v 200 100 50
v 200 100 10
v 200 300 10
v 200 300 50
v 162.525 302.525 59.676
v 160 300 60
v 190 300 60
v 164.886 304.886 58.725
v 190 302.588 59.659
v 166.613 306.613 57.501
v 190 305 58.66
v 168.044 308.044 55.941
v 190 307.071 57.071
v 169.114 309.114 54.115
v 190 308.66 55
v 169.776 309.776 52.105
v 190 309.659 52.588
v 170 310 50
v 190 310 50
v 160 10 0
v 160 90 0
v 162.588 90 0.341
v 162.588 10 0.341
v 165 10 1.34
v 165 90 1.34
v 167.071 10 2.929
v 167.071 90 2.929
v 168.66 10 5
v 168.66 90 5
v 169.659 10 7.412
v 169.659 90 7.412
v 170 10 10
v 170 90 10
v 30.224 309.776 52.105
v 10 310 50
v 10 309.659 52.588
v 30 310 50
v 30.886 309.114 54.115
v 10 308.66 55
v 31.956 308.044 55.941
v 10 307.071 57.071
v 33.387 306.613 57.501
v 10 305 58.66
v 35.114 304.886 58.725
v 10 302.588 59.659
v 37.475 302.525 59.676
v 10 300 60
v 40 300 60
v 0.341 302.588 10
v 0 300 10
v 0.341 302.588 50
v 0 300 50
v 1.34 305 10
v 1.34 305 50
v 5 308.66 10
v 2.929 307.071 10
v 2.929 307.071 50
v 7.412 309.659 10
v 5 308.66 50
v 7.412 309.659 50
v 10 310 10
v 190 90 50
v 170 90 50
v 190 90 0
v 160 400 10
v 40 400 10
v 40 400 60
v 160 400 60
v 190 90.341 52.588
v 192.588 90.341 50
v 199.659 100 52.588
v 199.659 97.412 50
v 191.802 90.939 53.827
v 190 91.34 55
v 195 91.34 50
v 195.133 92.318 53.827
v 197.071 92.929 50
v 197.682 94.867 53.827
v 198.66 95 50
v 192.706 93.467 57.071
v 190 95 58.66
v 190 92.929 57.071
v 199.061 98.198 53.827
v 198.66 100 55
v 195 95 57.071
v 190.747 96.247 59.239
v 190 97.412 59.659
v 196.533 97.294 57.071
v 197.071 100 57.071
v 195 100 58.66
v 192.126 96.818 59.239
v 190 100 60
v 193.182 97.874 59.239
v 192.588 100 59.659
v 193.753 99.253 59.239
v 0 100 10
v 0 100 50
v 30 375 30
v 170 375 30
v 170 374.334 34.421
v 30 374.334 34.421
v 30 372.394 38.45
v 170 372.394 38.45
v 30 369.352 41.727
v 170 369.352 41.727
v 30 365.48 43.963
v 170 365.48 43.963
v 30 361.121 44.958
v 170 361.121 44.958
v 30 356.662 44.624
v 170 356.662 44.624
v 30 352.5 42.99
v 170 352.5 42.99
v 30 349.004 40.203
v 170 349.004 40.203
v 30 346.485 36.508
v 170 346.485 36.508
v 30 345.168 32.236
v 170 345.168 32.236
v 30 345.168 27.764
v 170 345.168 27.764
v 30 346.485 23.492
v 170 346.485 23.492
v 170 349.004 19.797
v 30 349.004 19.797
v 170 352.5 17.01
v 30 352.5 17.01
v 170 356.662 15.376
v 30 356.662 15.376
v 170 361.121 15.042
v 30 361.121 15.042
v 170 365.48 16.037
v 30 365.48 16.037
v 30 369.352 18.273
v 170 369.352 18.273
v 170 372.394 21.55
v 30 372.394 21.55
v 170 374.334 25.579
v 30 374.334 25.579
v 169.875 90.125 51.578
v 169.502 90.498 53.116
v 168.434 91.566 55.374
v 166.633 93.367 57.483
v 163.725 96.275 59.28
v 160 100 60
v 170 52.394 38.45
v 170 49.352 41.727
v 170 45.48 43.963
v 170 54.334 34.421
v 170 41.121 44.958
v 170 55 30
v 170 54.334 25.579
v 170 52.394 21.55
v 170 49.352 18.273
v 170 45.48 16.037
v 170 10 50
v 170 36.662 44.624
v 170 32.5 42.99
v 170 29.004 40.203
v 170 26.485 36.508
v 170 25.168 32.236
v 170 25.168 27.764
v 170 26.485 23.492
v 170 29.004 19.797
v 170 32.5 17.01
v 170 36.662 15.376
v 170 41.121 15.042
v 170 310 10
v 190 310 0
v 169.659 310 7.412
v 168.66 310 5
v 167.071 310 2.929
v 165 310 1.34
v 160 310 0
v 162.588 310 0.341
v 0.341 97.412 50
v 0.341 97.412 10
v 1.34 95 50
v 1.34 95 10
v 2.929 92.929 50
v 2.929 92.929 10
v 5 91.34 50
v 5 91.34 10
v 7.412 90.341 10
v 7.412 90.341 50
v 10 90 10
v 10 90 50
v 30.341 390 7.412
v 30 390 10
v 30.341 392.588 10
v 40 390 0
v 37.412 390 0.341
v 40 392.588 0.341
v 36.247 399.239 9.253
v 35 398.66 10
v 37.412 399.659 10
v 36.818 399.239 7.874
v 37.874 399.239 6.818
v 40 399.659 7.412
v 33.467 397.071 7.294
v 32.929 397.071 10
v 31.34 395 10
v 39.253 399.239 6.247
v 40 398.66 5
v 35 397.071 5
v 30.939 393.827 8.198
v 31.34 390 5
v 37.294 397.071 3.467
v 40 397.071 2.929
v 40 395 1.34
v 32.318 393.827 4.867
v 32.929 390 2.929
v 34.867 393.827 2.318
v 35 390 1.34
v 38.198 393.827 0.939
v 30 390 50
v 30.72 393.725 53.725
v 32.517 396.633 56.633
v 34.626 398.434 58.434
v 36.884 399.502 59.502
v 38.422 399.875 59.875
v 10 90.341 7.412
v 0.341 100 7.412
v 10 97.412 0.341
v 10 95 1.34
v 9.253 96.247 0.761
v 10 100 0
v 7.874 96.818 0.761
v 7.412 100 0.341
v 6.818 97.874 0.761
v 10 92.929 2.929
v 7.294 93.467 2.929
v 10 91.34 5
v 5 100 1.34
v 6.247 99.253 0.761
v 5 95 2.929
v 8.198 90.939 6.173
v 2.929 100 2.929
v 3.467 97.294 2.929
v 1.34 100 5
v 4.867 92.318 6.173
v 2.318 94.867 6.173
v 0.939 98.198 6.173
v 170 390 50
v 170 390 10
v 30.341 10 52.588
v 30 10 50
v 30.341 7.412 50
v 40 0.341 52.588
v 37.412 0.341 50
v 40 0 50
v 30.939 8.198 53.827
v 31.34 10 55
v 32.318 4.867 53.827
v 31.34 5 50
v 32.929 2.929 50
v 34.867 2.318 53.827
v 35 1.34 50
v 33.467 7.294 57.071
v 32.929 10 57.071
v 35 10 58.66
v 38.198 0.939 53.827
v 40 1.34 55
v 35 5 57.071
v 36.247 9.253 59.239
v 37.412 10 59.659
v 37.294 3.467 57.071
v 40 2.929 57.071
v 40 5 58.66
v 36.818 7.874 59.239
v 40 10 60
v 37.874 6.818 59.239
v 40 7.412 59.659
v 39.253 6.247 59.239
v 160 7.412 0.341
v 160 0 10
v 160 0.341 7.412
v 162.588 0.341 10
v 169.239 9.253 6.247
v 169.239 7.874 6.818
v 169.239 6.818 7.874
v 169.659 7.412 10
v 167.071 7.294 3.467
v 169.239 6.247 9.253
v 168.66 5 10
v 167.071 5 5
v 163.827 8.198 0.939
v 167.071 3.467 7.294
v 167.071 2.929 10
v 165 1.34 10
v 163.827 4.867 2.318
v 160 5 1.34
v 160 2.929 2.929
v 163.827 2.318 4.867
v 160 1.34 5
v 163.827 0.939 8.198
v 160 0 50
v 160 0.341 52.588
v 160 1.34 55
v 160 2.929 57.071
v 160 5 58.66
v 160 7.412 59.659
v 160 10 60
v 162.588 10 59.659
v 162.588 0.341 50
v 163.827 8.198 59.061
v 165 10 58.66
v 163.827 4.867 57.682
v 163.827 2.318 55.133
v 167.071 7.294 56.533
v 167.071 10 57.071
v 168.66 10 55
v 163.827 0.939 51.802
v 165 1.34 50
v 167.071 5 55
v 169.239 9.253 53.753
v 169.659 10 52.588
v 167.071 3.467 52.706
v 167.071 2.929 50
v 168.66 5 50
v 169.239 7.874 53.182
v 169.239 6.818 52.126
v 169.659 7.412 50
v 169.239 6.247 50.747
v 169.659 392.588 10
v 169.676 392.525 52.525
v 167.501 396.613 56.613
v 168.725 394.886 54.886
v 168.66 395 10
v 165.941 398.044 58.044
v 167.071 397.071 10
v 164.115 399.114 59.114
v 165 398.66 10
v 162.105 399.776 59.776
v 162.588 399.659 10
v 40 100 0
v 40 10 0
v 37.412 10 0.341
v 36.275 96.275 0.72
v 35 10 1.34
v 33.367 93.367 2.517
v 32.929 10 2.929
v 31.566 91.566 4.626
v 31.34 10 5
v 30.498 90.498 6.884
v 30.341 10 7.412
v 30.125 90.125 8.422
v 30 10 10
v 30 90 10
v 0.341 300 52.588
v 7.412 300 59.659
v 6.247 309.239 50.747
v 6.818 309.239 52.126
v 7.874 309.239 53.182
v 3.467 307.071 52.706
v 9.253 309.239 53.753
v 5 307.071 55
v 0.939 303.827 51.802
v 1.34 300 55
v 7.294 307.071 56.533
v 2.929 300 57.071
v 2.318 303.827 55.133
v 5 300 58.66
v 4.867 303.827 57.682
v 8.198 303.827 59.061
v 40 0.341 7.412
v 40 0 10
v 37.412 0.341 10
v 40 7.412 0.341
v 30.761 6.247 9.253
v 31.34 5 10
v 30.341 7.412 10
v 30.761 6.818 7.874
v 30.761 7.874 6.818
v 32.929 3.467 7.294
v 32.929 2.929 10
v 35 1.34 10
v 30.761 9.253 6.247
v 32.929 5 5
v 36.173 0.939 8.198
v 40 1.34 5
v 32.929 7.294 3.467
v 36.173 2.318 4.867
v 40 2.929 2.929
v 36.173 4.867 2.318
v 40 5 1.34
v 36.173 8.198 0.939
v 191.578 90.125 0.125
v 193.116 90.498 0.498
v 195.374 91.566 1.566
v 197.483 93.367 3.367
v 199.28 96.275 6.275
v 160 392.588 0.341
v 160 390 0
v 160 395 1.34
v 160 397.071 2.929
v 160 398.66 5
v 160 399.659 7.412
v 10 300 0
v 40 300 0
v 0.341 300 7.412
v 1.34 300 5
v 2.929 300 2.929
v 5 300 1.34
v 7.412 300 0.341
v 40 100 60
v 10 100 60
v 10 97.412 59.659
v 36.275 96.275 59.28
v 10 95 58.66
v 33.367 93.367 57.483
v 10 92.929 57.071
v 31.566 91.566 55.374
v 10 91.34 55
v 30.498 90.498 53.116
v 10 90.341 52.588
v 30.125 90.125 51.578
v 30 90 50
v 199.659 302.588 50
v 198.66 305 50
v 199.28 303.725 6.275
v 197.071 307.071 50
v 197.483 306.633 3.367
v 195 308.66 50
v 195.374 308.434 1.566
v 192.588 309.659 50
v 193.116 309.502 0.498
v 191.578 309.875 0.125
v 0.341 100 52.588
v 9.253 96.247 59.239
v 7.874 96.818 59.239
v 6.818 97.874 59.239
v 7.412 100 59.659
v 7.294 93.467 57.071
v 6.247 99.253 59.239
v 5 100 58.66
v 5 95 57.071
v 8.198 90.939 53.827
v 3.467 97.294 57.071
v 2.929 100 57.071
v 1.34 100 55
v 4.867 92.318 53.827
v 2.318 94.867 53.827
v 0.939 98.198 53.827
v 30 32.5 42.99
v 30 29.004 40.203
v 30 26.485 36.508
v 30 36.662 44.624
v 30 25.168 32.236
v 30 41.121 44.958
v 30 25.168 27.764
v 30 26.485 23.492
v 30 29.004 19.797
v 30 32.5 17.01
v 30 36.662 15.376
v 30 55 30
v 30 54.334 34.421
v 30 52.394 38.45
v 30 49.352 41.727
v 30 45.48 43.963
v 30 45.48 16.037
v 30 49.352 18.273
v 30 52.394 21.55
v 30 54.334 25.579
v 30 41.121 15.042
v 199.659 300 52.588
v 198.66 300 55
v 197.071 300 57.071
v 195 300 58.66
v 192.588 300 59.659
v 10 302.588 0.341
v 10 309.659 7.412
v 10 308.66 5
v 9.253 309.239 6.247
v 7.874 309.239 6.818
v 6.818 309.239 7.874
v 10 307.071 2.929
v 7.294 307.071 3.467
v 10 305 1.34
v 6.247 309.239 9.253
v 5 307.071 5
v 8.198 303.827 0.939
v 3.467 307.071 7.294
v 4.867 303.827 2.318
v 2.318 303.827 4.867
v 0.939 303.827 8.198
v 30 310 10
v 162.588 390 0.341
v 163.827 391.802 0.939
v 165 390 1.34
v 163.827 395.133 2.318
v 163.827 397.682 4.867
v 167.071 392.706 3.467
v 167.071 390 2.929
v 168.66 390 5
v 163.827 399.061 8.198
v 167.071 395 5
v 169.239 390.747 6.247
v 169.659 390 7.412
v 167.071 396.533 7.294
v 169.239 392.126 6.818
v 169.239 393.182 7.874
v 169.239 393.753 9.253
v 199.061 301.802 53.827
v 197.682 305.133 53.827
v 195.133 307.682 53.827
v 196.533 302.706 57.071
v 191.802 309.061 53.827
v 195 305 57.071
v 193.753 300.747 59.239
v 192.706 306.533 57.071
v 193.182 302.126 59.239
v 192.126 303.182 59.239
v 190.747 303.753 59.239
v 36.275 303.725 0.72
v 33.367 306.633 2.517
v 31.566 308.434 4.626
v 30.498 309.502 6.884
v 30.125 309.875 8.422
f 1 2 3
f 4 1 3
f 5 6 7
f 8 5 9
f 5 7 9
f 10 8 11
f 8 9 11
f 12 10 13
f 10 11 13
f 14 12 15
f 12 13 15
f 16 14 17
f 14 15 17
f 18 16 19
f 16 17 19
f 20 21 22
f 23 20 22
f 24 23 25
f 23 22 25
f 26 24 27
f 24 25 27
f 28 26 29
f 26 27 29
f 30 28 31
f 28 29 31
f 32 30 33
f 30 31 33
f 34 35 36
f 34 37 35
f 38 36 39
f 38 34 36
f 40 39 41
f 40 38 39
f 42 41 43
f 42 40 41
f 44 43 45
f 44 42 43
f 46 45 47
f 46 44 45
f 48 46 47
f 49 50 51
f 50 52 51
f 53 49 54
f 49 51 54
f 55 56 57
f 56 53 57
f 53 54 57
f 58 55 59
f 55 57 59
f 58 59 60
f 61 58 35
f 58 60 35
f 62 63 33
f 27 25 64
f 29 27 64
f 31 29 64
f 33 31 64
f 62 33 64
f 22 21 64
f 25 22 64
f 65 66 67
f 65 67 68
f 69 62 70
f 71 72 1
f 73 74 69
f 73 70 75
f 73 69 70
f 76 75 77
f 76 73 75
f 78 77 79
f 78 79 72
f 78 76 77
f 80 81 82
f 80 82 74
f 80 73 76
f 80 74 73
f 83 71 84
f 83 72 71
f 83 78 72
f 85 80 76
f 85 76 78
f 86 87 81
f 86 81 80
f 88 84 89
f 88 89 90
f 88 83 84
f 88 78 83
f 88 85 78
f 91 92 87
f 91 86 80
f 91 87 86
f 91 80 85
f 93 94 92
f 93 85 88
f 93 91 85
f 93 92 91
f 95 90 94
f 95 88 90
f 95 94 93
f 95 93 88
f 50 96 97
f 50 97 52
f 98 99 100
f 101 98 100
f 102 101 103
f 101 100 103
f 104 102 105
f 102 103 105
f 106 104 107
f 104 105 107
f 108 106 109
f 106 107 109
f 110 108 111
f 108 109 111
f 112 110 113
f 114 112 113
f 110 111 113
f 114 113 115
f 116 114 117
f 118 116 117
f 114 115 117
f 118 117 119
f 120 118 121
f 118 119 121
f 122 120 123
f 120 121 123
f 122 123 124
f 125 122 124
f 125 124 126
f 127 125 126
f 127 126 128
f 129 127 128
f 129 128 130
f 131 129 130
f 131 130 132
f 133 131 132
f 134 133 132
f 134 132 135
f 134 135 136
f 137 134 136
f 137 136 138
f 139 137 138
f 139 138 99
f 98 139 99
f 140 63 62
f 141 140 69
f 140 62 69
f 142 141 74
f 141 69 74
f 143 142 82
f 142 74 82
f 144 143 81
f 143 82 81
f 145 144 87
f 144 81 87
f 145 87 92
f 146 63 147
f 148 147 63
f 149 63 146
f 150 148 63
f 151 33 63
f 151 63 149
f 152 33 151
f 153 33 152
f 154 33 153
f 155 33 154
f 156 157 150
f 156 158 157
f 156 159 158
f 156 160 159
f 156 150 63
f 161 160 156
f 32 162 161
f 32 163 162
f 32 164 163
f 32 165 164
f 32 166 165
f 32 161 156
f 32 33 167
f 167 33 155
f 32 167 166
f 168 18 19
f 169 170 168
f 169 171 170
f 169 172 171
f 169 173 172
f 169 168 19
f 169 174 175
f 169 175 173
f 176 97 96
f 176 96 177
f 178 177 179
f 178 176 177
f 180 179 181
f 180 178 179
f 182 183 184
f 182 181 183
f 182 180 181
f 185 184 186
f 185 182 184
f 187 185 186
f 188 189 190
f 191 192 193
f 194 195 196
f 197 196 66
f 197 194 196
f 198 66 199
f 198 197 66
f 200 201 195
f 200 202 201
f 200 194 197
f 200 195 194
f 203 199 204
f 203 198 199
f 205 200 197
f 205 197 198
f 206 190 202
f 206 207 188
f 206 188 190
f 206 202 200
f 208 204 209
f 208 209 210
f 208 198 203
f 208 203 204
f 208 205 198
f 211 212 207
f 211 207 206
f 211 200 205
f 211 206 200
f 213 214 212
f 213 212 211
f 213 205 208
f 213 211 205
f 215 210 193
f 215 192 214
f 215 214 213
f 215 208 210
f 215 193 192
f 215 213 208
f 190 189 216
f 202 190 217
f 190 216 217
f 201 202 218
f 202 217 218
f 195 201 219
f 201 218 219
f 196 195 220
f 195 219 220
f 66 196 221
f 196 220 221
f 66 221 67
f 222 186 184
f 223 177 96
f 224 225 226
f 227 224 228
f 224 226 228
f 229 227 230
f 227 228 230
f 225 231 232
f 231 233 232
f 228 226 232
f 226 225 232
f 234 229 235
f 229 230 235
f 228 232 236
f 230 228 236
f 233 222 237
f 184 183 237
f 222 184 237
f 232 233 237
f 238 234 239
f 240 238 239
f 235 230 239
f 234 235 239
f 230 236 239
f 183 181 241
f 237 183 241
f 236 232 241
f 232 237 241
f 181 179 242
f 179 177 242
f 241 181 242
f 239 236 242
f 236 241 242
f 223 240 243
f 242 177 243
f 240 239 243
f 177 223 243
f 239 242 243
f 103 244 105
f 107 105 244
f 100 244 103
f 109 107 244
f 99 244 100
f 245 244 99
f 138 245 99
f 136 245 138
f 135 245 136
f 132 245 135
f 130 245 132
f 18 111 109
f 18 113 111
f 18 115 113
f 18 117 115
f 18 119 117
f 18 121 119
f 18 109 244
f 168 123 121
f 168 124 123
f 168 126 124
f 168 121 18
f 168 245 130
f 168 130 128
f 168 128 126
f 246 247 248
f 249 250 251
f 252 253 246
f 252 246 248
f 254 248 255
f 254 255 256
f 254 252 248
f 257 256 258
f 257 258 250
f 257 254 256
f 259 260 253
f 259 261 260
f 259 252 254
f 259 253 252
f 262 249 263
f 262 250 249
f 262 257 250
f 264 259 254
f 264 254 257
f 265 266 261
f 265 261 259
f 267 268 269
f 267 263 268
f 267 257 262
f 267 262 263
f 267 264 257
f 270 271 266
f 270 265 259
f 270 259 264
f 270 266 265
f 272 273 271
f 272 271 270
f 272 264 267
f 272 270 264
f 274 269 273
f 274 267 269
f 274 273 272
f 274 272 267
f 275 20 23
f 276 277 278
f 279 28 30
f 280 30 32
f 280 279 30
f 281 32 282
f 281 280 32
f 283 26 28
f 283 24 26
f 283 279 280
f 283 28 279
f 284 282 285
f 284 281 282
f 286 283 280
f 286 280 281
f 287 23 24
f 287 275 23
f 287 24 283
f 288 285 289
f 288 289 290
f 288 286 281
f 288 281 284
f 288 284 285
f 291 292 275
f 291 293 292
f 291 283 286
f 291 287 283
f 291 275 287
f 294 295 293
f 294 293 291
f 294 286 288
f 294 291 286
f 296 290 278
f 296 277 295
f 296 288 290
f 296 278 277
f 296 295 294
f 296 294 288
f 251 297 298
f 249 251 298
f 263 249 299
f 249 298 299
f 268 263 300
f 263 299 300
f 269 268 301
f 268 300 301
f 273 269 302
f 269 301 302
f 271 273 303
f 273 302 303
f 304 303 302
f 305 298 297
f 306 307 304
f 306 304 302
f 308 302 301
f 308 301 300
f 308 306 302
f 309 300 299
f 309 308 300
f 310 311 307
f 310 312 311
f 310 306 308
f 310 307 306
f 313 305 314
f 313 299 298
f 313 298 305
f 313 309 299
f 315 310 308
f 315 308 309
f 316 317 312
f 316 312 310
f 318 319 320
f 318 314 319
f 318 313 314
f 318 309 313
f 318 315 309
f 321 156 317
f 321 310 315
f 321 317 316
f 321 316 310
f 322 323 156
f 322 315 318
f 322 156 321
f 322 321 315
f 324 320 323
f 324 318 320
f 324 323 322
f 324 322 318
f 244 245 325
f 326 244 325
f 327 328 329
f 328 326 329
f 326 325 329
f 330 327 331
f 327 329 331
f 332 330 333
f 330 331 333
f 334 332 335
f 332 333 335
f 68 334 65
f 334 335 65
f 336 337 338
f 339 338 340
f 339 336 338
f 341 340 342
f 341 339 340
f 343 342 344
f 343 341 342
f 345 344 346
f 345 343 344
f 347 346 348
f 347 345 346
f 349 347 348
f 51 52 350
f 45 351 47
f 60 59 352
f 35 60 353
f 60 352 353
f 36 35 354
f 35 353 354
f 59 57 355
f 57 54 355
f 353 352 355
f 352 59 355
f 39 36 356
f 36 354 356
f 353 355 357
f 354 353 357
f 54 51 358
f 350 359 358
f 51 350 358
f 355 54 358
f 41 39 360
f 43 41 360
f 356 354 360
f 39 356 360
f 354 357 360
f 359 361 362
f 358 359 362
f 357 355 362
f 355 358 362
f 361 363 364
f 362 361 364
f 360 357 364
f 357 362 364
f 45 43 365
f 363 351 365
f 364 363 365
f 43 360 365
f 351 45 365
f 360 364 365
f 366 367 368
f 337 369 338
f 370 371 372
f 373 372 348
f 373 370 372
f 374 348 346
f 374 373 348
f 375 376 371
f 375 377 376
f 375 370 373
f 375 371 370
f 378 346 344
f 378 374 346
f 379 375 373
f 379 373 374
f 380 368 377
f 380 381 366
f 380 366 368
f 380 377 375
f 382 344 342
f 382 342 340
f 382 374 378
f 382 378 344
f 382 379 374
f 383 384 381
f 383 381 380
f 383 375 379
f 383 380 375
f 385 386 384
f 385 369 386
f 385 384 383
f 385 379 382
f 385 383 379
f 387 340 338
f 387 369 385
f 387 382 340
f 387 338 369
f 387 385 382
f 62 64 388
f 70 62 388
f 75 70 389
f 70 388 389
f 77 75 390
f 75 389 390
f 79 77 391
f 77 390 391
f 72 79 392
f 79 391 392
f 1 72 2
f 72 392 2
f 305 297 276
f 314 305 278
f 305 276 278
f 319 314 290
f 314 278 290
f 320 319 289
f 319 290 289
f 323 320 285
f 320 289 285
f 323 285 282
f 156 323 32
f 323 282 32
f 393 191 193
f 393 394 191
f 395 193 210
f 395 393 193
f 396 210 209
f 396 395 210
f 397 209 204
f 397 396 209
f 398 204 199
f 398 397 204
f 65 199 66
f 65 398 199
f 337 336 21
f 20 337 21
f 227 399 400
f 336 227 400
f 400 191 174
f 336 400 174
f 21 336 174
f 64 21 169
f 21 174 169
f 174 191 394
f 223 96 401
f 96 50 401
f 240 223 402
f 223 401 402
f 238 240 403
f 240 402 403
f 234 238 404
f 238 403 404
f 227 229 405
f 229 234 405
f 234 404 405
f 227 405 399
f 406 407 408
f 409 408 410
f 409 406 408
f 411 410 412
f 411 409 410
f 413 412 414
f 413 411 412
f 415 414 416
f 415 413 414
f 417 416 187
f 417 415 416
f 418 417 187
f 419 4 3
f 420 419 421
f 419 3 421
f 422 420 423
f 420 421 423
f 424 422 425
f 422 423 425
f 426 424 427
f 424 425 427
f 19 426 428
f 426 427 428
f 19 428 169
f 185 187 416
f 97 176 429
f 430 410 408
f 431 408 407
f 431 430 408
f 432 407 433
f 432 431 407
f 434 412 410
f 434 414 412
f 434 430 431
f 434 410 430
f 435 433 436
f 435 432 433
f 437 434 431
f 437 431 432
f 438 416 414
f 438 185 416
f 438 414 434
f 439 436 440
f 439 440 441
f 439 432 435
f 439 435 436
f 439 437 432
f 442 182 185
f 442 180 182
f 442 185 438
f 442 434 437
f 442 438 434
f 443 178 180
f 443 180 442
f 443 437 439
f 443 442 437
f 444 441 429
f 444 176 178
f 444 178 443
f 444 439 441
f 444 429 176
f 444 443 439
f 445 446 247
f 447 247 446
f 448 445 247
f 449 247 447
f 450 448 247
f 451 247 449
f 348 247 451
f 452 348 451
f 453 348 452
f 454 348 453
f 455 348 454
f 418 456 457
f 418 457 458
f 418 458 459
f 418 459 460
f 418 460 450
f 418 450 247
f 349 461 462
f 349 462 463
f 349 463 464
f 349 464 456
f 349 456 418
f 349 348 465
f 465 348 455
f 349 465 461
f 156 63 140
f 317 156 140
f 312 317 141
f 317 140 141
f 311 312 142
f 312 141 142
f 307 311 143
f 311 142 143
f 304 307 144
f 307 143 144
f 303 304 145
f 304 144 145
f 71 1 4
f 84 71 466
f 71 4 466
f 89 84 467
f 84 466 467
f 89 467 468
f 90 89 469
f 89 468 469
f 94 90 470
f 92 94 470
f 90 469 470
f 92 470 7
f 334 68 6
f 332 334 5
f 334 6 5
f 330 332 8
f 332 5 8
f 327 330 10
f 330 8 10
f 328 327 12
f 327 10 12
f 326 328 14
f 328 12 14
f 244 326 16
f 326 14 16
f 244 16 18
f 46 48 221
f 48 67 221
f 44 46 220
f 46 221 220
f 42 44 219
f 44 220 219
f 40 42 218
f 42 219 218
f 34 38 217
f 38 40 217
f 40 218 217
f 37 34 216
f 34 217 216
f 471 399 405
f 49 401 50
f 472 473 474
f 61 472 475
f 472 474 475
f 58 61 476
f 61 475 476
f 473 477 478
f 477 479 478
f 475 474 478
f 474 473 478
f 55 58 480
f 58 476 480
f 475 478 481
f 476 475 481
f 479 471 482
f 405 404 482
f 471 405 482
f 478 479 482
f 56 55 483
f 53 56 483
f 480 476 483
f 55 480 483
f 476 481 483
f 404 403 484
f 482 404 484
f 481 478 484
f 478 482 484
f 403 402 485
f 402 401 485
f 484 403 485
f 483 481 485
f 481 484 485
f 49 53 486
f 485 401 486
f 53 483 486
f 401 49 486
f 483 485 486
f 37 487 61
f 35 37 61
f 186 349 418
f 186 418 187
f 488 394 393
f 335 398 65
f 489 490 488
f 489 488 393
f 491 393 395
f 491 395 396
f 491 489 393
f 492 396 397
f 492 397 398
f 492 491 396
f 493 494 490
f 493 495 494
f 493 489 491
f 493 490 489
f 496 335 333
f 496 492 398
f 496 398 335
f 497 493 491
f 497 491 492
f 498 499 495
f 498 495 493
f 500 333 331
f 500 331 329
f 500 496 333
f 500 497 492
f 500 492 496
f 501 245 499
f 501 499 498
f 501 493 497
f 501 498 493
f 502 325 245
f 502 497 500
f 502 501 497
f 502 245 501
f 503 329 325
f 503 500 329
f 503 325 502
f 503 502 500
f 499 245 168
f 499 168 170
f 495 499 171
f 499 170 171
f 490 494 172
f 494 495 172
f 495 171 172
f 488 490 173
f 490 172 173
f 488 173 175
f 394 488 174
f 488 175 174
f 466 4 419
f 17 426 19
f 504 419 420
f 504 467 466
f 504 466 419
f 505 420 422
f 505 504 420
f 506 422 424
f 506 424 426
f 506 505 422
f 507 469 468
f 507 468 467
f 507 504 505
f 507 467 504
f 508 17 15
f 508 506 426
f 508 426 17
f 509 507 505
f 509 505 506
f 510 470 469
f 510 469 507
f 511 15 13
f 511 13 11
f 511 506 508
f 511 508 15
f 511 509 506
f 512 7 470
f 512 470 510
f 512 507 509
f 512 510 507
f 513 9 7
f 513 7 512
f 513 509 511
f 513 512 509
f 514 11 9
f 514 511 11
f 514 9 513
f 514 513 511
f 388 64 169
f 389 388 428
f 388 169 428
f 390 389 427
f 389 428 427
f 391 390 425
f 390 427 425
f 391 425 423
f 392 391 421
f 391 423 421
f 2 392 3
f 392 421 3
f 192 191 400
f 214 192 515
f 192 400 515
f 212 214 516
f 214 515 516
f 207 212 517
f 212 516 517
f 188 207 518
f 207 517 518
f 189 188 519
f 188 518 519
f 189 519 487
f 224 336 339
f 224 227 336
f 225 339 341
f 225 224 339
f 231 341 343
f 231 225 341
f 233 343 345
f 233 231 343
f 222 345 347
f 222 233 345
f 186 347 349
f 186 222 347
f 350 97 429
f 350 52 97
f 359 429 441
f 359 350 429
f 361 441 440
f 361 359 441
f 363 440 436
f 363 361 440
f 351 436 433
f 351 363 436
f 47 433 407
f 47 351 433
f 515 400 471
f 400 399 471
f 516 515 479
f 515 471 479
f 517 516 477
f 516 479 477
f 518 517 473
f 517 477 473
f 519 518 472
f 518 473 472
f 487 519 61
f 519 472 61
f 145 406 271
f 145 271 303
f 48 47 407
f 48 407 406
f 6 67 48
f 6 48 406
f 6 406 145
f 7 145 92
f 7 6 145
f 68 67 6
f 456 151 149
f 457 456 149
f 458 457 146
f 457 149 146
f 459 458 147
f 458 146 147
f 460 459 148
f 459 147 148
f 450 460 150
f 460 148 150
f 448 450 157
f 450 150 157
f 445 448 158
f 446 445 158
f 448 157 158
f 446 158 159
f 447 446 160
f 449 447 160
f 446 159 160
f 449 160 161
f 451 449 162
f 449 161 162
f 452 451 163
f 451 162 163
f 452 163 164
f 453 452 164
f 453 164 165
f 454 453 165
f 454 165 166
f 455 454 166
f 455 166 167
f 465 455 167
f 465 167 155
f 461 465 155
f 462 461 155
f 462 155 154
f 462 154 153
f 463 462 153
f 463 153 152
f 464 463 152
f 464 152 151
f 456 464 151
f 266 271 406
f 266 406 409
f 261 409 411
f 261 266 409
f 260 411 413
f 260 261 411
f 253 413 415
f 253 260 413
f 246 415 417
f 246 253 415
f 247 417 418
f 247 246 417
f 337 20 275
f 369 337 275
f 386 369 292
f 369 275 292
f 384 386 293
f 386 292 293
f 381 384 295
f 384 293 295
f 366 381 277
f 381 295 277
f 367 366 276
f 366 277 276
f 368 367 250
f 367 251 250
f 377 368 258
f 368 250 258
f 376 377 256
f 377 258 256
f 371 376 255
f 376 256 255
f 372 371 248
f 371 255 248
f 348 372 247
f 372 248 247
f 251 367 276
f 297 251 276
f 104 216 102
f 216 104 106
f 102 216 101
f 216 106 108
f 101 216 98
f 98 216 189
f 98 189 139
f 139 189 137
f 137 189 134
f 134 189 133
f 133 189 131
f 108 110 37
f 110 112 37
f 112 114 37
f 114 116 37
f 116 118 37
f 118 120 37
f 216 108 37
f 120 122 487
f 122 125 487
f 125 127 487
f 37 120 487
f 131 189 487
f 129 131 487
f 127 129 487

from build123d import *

# Parameters (mm, degrees)
SKETCH1_W                                  = 200
SKETCH1_H                                  = 400
BOSS_EXTRUDE1_DEPTH                        = 60
SKETCH2_R                                  = 15
CUT_EXTRUDE1_DEPTH                         = 452.220566907
SKETCH3_W                                  = 30
SKETCH3_H                                  = 90
CUT_EXTRUDE2_DEPTH                         = 452.220566907
MIRROR1_AT_THE_SECOND_PLANE_COPY_1_SKETC_W = 30
MIRROR1_AT_THE_SECOND_PLANE_COPY_1_SKETC_H = 90
MIRROR1_AT_THE_SECOND_PLANE_COPY_1_DEPTH   = 452.220566907
FILLET1_R                                  = 10
FILLET2_R                                  = 10


with BuildPart() as part:
    # Sketch1 → Boss-Extrude1 (new body)
    with BuildSketch(Plane.XY):
        with Locations((100, 200)):
            Rectangle(SKETCH1_W, SKETCH1_H)
    extrude(amount=BOSS_EXTRUDE1_DEPTH)

    # Sketch2 → Cut-Extrude1 (cut, through all)
    with BuildSketch(Plane(origin=(200, 0, 0), x_dir=(0, 0, -1), z_dir=(1, 0, 0))):
        with Locations(Location((-30, 40, 0), (0, 0, 90))):
            Circle(SKETCH2_R)
        with Locations(Location((-30, 360, 0), (0, 0, 90))):
            Circle(SKETCH2_R)
    extrude(amount=-CUT_EXTRUDE1_DEPTH, mode=Mode.SUBTRACT)

    # Sketch3 → Cut-Extrude2 (cut, through all)
    with BuildSketch(Plane(origin=(0, 0, 0), x_dir=(-1, 0, 0), z_dir=(0, 0, -1))):
        with Locations((-15, 45)):
            Rectangle(SKETCH3_W, SKETCH3_H)
    cut_extrude2 = extrude(amount=-CUT_EXTRUDE2_DEPTH, mode=Mode.SUBTRACT)

    # Mirror1: Cut-Extrude2 across plane
    add(cut_extrude2.mirror(Plane(origin=(100, 0, 0), x_dir=(0, 0, 1), z_dir=(1, 0, 0))), mode=Mode.SUBTRACT)

    # Mirror1 at the second plane: Cut-Extrude2 across plane
    add(cut_extrude2.mirror(Plane.ZX.offset(200)), mode=Mode.SUBTRACT)

    # Mirror1 at the second plane copy 1 sketc → Mirror1 at the second plane copy 1 (cut, through all)
    with BuildSketch(Plane(origin=(200, 400, 0), x_dir=(1, 0, 0), z_dir=(0, 0, -1))):
        with Locations((-15, 45)):
            Rectangle(MIRROR1_AT_THE_SECOND_PLANE_COPY_1_SKETC_W, MIRROR1_AT_THE_SECOND_PLANE_COPY_1_SKETC_H)
    extrude(amount=-MIRROR1_AT_THE_SECOND_PLANE_COPY_1_DEPTH, mode=Mode.SUBTRACT)

    # Fillet1
    fillet1_edges = [part.edges().sort_by_distance(p)[0] for p in [
        (100, 0, 0),
        (0, 90, 30),
        (30, 45, 60),
        (30, 0, 30),
        (15, 90, 60),
        (15, 90, 0),
        (30, 45, 0),
        (0, 200, 0),
        (0, 200, 60),
        (30, 355, 0),
        (15, 310, 0),
        (0, 310, 30),
        (30, 400, 30),
        (15, 310, 60),
        (30, 355, 60),
        (100, 400, 0),
    ]]
    fillet(fillet1_edges, radius=FILLET1_R)

    # Fillet2
    # the kernel refuses this fillet: 10 mm, written as the material it takes off along each edge
    with BuildSketch(Plane(origin=(40, 10, 50), x_dir=(0, -1, 0), z_dir=(0, 0, 1))) as fillet2_piece_1_section:
        Polygon((0, 0), (FILLET2_R, 0), (FILLET2_R, -FILLET2_R), (0, -FILLET2_R), align=None)
    fillet2_piece_1 = extrude(amount=FILLET2_R, mode=Mode.PRIVATE)
    fillet2_piece_1 = fillet2_piece_1 - Plane(origin=(40, 10, 50), x_dir=(0.7071067811865476, 0.7071067811865475, 0), z_dir=(0, 0, 1)) * Sphere(FILLET2_R, mode=Mode.PRIVATE)
    add(fillet2_piece_1, mode=Mode.SUBTRACT)
    with BuildSketch(Plane(origin=(190, 300, 50), x_dir=(1, 0, 0), z_dir=(0, 0, 1))) as fillet2_piece_2_section:
        Polygon((0, 0), (FILLET2_R, 0), (FILLET2_R, FILLET2_R), (0, FILLET2_R), align=None)
    fillet2_piece_2 = extrude(amount=FILLET2_R, mode=Mode.PRIVATE)
    fillet2_piece_2 = fillet2_piece_2 - Plane(origin=(190, 300, 50), x_dir=(-0.7071067811865471, -0.707106781186548, 0), z_dir=(0, 0, 1)) * Sphere(FILLET2_R, mode=Mode.PRIVATE)
    add(fillet2_piece_2, mode=Mode.SUBTRACT)
    with BuildSketch(Plane(origin=(190, 100, 50), x_dir=(0, -1, 0), z_dir=(0, 0, 1))) as fillet2_piece_3_section:
        Polygon((0, 0), (FILLET2_R, 0), (FILLET2_R, FILLET2_R), (0, FILLET2_R), align=None)
    fillet2_piece_3 = extrude(amount=FILLET2_R, mode=Mode.PRIVATE)
    fillet2_piece_3 = fillet2_piece_3 - Plane(origin=(190, 100, 50), x_dir=(-0.7071067811865472, 0.7071067811865478, 0), z_dir=(0, 0, 1)) * Sphere(FILLET2_R, mode=Mode.PRIVATE)
    add(fillet2_piece_3, mode=Mode.SUBTRACT)
    with BuildSketch(Plane(origin=(160, 10, 50), x_dir=(0, -1, 0), z_dir=(1, 0, 0))) as fillet2_piece_4_section:
        Polygon((0, 0), (FILLET2_R, 0), (FILLET2_R, -FILLET2_R), (0, -FILLET2_R), align=None)
    fillet2_piece_4 = extrude(amount=FILLET2_R, mode=Mode.PRIVATE)
    fillet2_piece_4 = fillet2_piece_4 - Plane(origin=(160, 10, 50), x_dir=(0, 0.7071067811865475, -0.7071067811865475), z_dir=(1, 0, 0)) * Sphere(FILLET2_R, mode=Mode.PRIVATE)
    add(fillet2_piece_4, mode=Mode.SUBTRACT)
    with BuildSketch(Plane(origin=(170, 10, 10), x_dir=(0, 0, -1), z_dir=(0, 1, 0))) as fillet2_piece_5:
        with BuildLine():
            CenterArc((10 - FILLET2_R, FILLET2_R), FILLET2_R, 270, 90)
            Line((10, FILLET2_R), (10, 0))
            Line((10, 0), (10 - FILLET2_R, 0))
        make_face()
    revolve(axis=Axis((170, 10, 10), (-1, 0, 0)), revolution_arc=90, mode=Mode.SUBTRACT)
    with BuildSketch(Plane(origin=(170, 390, 10), x_dir=(0, 0, -1), z_dir=(0, -1, 0))) as fillet2_piece_6:
        with BuildLine():
            CenterArc((10 - FILLET2_R, -FILLET2_R), FILLET2_R, 0, 90)
            Line((10, -FILLET2_R), (10, 0))
            Line((10, 0), (10 - FILLET2_R, 0))
        make_face()
    revolve(axis=Axis((170, 390, 10), (1, 0, 0)), revolution_arc=90, mode=Mode.SUBTRACT)
    with BuildSketch(Plane(origin=(200, 335, 0), x_dir=(-1, 0, 0), z_dir=(0, -1, 0))) as fillet2_piece_7:
        with BuildLine():
            CenterArc((FILLET2_R, -FILLET2_R), FILLET2_R, 90, 90)
            Line((0, -FILLET2_R), (0, 0))
            Line((0, 0), (FILLET2_R, 0))
        make_face()
    extrude(amount=270, mode=Mode.SUBTRACT)
    with BuildSketch(Plane(origin=(200, 300, 60), x_dir=(-1, 0, 0), z_dir=(0, -1, 0))) as fillet2_piece_8:
        with BuildLine():
            CenterArc((FILLET2_R, FILLET2_R), FILLET2_R, 180, 90)
            Line((0, FILLET2_R), (0, 0))
            Line((0, 0), (FILLET2_R, 0))
        make_face()
    extrude(amount=200, mode=Mode.SUBTRACT)
    with BuildSketch(Plane(origin=(170, 90, 0), x_dir=(-1, 0, 0), z_dir=(0, -1, 0))) as fillet2_piece_9:
        with BuildLine():
            CenterArc((FILLET2_R, -FILLET2_R), FILLET2_R, 90, 90)
            Line((0, -FILLET2_R), (0, 0))
            Line((0, 0), (FILLET2_R, 0))
        make_face()
    extrude(amount=80, mode=Mode.SUBTRACT)
    with BuildSketch(Plane(origin=(200, 90, -25), x_dir=(-1, 0, 0), z_dir=(0, 0, 1)), Plane(origin=(200, 310, -25), x_dir=(0, -1, 0), z_dir=(0, 0, 1)), Plane(origin=(170, 400, 10), x_dir=(0, -1, 0), z_dir=(0, 0, 1))) as fillet2_piece_10:
        with BuildLine():
            CenterArc((FILLET2_R, -FILLET2_R), FILLET2_R, 90, 90)
            Line((0, -FILLET2_R), (0, 0))
            Line((0, 0), (FILLET2_R, 0))
        make_face()
    extrude(amount=75, mode=Mode.SUBTRACT)
    with BuildSketch(Plane(origin=(170, 0, 10), x_dir=(0, 1, 0), z_dir=(0, 0, 1))) as fillet2_piece_11:
        with BuildLine():
            CenterArc((FILLET2_R, FILLET2_R), FILLET2_R, 180, 90)
            Line((0, FILLET2_R), (0, 0))
            Line((0, 0), (FILLET2_R, 0))
        make_face()
    extrude(amount=40, mode=Mode.SUBTRACT)
    with BuildSketch(Plane(origin=(190, 90, 60), x_dir=(0, 1, 0), z_dir=(-1, 0, 0))) as fillet2_piece_12:
        with BuildLine():
            CenterArc((FILLET2_R, FILLET2_R), FILLET2_R, 180, 90)
            Line((0, FILLET2_R), (0, 0))
            Line((0, 0), (FILLET2_R, 0))
        make_face()
    extrude(amount=20, mode=Mode.SUBTRACT)
    with BuildSketch(Plane(origin=(170, 90, 60), x_dir=(-1, 0, 0), z_dir=(0, -1, 0)), Plane(origin=(170, 310, 0), x_dir=(-1, 0, 0), z_dir=(0, 1, 0))) as fillet2_piece_13:
        with BuildLine():
            CenterArc((FILLET2_R, FILLET2_R), FILLET2_R, 180, 90)
            Line((0, FILLET2_R), (0, 0))
            Line((0, 0), (FILLET2_R, 0))
        make_face()
    extrude(amount=80, mode=Mode.SUBTRACT)
    with BuildSketch(Plane(origin=(170, 310, 60), x_dir=(-1, 0, 0), z_dir=(0, 1, 0))) as fillet2_piece_14:
        with BuildLine():
            CenterArc((FILLET2_R, -FILLET2_R), FILLET2_R, 90, 90)
            Line((0, -FILLET2_R), (0, 0))
            Line((0, 0), (FILLET2_R, 0))
        make_face()
    extrude(amount=115, mode=Mode.SUBTRACT)
    with BuildSketch(Plane(origin=(190, 310, 60), x_dir=(0, -1, 0), z_dir=(-1, 0, 0))) as fillet2_piece_15:
        with BuildLine():
            CenterArc((FILLET2_R, -FILLET2_R), FILLET2_R, 90, 90)
            Line((0, -FILLET2_R), (0, 0))
            Line((0, 0), (FILLET2_R, 0))
        make_face()
    extrude(amount=20, mode=Mode.SUBTRACT)
    with BuildSketch(Plane(origin=(160, 0, 60), x_dir=(0, 1, 0), z_dir=(-1, 0, 0))) as fillet2_piece_16:
        with BuildLine():
            CenterArc((FILLET2_R, FILLET2_R), FILLET2_R, 180, 90)
            Line((0, FILLET2_R), (0, 0))
            Line((0, 0), (FILLET2_R, 0))
        make_face()
    extrude(amount=120, mode=Mode.SUBTRACT)
    with BuildSketch(Plane(origin=(170, 115, 60), x_dir=(-1, 0, 0), z_dir=(0, -1, 0))) as fillet2_piece_17a_section:
        with BuildLine():
            CenterArc((FILLET2_R, FILLET2_R), FILLET2_R, 180, 90)
            Line((0, FILLET2_R), (0, 0))
            Line((0, 0), (FILLET2_R, 0))
        make_face()
    fillet2_piece_17a = extrude(amount=105, mode=Mode.PRIVATE)
    fillet2_piece_17a = split(fillet2_piece_17a, bisect_by=Plane(origin=(167.736048857, 90, 57.736048857), z_dir=(0, 1, 0)), keep=Keep.TOP, mode=Mode.PRIVATE)
    with BuildSketch(Plane(origin=(190, 90, 60), x_dir=(0, 1, 0), z_dir=(-1, 0, 0))) as fillet2_piece_17b_section:
        with BuildLine():
            CenterArc((FILLET2_R, FILLET2_R), FILLET2_R, 180, 90)
            Line((0, FILLET2_R), (0, 0))
            Line((0, 0), (FILLET2_R, 0))
        make_face()
    fillet2_piece_17b = extrude(amount=45, mode=Mode.PRIVATE)
    fillet2_piece_17b = split(fillet2_piece_17b, bisect_by=Plane(origin=(170, 92.263951143, 57.736048857), z_dir=(-1, 0, 0)), keep=Keep.TOP, mode=Mode.PRIVATE)
    fillet2_piece_17 = fillet2_piece_17a & fillet2_piece_17b
    add(fillet2_piece_17, mode=Mode.SUBTRACT)
    with BuildSketch(Plane(origin=(190, 310, 60), x_dir=(0, -1, 0), z_dir=(-1, 0, 0))) as fillet2_piece_18a_section:
        with BuildLine():
            CenterArc((FILLET2_R, -FILLET2_R), FILLET2_R, 90, 90)
            Line((0, -FILLET2_R), (0, 0))
            Line((0, 0), (FILLET2_R, 0))
        make_face()
    fillet2_piece_18a = extrude(amount=45, mode=Mode.PRIVATE)
    fillet2_piece_18a = split(fillet2_piece_18a, bisect_by=Plane(origin=(170, 307.736048857, 57.736048857), z_dir=(-1, 0, 0)), keep=Keep.TOP, mode=Mode.PRIVATE)
    with BuildSketch(Plane(origin=(170, 285, 60), x_dir=(-1, 0, 0), z_dir=(0, 1, 0))) as fillet2_piece_18b_section:
        with BuildLine():
            CenterArc((FILLET2_R, -FILLET2_R), FILLET2_R, 90, 90)
            Line((0, -FILLET2_R), (0, 0))
            Line((0, 0), (FILLET2_R, 0))
        make_face()
    fillet2_piece_18b = extrude(amount=140, mode=Mode.PRIVATE)
    fillet2_piece_18b = split(fillet2_piece_18b, bisect_by=Plane(origin=(167.736048857, 310, 57.736048857), z_dir=(0, -1, 0)), keep=Keep.TOP, mode=Mode.PRIVATE)
    fillet2_piece_18 = fillet2_piece_18a & fillet2_piece_18b
    add(fillet2_piece_18, mode=Mode.SUBTRACT)


solid = part.part
